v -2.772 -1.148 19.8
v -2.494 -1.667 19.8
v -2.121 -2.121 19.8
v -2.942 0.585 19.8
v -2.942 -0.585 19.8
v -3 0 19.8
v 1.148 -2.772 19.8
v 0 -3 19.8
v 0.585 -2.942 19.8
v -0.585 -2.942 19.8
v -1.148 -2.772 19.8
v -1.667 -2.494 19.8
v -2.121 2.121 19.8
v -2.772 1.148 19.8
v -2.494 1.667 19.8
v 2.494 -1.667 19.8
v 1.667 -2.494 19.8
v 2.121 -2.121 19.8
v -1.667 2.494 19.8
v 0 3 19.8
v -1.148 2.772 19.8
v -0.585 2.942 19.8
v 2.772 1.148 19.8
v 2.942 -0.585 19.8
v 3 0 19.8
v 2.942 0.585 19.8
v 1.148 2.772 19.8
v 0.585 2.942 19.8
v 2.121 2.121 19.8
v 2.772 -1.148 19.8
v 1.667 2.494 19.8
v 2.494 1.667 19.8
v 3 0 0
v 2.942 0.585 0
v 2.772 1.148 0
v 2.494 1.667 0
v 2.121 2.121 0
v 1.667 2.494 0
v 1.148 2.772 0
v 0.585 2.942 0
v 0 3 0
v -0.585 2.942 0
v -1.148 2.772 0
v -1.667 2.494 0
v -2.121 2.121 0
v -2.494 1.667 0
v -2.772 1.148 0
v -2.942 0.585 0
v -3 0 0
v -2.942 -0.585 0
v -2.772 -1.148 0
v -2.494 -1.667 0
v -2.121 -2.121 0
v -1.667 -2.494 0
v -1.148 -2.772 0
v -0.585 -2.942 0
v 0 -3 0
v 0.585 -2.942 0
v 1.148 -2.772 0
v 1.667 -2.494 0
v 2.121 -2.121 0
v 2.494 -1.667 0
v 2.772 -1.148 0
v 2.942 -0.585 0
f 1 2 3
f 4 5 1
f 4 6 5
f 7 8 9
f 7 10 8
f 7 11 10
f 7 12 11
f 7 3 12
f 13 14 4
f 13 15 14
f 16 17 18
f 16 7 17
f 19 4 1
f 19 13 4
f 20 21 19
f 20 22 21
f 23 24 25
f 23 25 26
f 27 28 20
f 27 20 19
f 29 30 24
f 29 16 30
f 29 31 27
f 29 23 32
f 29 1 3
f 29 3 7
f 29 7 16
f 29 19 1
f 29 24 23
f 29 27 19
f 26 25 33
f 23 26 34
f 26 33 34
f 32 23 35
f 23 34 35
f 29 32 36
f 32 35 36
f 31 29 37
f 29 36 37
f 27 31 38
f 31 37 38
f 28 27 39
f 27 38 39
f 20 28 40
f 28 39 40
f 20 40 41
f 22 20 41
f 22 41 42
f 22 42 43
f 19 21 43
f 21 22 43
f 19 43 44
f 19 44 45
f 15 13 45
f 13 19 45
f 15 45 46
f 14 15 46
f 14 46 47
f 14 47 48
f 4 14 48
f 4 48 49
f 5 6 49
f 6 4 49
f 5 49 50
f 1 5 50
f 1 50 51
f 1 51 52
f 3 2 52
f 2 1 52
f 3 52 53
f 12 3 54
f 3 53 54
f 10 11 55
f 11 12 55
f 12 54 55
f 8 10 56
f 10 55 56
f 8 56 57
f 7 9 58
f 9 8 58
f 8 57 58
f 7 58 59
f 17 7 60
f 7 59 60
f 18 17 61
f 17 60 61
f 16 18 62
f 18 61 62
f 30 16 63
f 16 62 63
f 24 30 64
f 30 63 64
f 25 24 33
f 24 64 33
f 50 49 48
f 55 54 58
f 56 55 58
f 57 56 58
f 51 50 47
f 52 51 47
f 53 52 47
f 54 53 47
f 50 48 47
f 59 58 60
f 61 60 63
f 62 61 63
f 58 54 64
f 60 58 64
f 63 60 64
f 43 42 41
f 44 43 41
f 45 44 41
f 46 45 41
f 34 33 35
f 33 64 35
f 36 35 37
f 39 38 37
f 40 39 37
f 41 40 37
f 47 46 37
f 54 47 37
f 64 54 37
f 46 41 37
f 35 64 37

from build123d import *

# Parameters (mm, degrees)
SKETCH1_R           = 7.5
SKETCH1_R_2         = 3
BOSS_EXTRUDE1_DEPTH = 19.8
CUT_EXTRUDE1_START  = 3.9
SKETCH1_6_R         = 7.5
SKETCH1_6_R_2       = 3
CUT_EXTRUDE1_DEPTH  = 12
SKETCH1_7_R         = 7.5
SKETCH1_7_R_2       = 3
CUT_EXTRUDE5_DEPTH  = 20.8


with BuildPart() as part:
    # Sketch1 → Boss-Extrude1 (new body)
    with BuildSketch(Plane.XY):
        Circle(SKETCH1_R)
        Circle(SKETCH1_R_2, mode=Mode.SUBTRACT)
        Circle(SKETCH1_R_2)
    extrude(amount=BOSS_EXTRUDE1_DEPTH)

    # Sketch1_6 → Cut-Extrude1 (cut)
    with BuildSketch(Plane.XY.offset(CUT_EXTRUDE1_START)):
        Circle(SKETCH1_6_R)
        Circle(SKETCH1_6_R_2, mode=Mode.SUBTRACT)
    extrude(amount=CUT_EXTRUDE1_DEPTH, mode=Mode.SUBTRACT)

    # Sketch1_7 → Cut-Extrude5 (cut, through all)
    with BuildSketch(Plane.XY):
        Circle(SKETCH1_7_R)
        Circle(SKETCH1_7_R_2, mode=Mode.SUBTRACT)
    extrude(amount=CUT_EXTRUDE5_DEPTH, mode=Mode.SUBTRACT)


solid = part.part
